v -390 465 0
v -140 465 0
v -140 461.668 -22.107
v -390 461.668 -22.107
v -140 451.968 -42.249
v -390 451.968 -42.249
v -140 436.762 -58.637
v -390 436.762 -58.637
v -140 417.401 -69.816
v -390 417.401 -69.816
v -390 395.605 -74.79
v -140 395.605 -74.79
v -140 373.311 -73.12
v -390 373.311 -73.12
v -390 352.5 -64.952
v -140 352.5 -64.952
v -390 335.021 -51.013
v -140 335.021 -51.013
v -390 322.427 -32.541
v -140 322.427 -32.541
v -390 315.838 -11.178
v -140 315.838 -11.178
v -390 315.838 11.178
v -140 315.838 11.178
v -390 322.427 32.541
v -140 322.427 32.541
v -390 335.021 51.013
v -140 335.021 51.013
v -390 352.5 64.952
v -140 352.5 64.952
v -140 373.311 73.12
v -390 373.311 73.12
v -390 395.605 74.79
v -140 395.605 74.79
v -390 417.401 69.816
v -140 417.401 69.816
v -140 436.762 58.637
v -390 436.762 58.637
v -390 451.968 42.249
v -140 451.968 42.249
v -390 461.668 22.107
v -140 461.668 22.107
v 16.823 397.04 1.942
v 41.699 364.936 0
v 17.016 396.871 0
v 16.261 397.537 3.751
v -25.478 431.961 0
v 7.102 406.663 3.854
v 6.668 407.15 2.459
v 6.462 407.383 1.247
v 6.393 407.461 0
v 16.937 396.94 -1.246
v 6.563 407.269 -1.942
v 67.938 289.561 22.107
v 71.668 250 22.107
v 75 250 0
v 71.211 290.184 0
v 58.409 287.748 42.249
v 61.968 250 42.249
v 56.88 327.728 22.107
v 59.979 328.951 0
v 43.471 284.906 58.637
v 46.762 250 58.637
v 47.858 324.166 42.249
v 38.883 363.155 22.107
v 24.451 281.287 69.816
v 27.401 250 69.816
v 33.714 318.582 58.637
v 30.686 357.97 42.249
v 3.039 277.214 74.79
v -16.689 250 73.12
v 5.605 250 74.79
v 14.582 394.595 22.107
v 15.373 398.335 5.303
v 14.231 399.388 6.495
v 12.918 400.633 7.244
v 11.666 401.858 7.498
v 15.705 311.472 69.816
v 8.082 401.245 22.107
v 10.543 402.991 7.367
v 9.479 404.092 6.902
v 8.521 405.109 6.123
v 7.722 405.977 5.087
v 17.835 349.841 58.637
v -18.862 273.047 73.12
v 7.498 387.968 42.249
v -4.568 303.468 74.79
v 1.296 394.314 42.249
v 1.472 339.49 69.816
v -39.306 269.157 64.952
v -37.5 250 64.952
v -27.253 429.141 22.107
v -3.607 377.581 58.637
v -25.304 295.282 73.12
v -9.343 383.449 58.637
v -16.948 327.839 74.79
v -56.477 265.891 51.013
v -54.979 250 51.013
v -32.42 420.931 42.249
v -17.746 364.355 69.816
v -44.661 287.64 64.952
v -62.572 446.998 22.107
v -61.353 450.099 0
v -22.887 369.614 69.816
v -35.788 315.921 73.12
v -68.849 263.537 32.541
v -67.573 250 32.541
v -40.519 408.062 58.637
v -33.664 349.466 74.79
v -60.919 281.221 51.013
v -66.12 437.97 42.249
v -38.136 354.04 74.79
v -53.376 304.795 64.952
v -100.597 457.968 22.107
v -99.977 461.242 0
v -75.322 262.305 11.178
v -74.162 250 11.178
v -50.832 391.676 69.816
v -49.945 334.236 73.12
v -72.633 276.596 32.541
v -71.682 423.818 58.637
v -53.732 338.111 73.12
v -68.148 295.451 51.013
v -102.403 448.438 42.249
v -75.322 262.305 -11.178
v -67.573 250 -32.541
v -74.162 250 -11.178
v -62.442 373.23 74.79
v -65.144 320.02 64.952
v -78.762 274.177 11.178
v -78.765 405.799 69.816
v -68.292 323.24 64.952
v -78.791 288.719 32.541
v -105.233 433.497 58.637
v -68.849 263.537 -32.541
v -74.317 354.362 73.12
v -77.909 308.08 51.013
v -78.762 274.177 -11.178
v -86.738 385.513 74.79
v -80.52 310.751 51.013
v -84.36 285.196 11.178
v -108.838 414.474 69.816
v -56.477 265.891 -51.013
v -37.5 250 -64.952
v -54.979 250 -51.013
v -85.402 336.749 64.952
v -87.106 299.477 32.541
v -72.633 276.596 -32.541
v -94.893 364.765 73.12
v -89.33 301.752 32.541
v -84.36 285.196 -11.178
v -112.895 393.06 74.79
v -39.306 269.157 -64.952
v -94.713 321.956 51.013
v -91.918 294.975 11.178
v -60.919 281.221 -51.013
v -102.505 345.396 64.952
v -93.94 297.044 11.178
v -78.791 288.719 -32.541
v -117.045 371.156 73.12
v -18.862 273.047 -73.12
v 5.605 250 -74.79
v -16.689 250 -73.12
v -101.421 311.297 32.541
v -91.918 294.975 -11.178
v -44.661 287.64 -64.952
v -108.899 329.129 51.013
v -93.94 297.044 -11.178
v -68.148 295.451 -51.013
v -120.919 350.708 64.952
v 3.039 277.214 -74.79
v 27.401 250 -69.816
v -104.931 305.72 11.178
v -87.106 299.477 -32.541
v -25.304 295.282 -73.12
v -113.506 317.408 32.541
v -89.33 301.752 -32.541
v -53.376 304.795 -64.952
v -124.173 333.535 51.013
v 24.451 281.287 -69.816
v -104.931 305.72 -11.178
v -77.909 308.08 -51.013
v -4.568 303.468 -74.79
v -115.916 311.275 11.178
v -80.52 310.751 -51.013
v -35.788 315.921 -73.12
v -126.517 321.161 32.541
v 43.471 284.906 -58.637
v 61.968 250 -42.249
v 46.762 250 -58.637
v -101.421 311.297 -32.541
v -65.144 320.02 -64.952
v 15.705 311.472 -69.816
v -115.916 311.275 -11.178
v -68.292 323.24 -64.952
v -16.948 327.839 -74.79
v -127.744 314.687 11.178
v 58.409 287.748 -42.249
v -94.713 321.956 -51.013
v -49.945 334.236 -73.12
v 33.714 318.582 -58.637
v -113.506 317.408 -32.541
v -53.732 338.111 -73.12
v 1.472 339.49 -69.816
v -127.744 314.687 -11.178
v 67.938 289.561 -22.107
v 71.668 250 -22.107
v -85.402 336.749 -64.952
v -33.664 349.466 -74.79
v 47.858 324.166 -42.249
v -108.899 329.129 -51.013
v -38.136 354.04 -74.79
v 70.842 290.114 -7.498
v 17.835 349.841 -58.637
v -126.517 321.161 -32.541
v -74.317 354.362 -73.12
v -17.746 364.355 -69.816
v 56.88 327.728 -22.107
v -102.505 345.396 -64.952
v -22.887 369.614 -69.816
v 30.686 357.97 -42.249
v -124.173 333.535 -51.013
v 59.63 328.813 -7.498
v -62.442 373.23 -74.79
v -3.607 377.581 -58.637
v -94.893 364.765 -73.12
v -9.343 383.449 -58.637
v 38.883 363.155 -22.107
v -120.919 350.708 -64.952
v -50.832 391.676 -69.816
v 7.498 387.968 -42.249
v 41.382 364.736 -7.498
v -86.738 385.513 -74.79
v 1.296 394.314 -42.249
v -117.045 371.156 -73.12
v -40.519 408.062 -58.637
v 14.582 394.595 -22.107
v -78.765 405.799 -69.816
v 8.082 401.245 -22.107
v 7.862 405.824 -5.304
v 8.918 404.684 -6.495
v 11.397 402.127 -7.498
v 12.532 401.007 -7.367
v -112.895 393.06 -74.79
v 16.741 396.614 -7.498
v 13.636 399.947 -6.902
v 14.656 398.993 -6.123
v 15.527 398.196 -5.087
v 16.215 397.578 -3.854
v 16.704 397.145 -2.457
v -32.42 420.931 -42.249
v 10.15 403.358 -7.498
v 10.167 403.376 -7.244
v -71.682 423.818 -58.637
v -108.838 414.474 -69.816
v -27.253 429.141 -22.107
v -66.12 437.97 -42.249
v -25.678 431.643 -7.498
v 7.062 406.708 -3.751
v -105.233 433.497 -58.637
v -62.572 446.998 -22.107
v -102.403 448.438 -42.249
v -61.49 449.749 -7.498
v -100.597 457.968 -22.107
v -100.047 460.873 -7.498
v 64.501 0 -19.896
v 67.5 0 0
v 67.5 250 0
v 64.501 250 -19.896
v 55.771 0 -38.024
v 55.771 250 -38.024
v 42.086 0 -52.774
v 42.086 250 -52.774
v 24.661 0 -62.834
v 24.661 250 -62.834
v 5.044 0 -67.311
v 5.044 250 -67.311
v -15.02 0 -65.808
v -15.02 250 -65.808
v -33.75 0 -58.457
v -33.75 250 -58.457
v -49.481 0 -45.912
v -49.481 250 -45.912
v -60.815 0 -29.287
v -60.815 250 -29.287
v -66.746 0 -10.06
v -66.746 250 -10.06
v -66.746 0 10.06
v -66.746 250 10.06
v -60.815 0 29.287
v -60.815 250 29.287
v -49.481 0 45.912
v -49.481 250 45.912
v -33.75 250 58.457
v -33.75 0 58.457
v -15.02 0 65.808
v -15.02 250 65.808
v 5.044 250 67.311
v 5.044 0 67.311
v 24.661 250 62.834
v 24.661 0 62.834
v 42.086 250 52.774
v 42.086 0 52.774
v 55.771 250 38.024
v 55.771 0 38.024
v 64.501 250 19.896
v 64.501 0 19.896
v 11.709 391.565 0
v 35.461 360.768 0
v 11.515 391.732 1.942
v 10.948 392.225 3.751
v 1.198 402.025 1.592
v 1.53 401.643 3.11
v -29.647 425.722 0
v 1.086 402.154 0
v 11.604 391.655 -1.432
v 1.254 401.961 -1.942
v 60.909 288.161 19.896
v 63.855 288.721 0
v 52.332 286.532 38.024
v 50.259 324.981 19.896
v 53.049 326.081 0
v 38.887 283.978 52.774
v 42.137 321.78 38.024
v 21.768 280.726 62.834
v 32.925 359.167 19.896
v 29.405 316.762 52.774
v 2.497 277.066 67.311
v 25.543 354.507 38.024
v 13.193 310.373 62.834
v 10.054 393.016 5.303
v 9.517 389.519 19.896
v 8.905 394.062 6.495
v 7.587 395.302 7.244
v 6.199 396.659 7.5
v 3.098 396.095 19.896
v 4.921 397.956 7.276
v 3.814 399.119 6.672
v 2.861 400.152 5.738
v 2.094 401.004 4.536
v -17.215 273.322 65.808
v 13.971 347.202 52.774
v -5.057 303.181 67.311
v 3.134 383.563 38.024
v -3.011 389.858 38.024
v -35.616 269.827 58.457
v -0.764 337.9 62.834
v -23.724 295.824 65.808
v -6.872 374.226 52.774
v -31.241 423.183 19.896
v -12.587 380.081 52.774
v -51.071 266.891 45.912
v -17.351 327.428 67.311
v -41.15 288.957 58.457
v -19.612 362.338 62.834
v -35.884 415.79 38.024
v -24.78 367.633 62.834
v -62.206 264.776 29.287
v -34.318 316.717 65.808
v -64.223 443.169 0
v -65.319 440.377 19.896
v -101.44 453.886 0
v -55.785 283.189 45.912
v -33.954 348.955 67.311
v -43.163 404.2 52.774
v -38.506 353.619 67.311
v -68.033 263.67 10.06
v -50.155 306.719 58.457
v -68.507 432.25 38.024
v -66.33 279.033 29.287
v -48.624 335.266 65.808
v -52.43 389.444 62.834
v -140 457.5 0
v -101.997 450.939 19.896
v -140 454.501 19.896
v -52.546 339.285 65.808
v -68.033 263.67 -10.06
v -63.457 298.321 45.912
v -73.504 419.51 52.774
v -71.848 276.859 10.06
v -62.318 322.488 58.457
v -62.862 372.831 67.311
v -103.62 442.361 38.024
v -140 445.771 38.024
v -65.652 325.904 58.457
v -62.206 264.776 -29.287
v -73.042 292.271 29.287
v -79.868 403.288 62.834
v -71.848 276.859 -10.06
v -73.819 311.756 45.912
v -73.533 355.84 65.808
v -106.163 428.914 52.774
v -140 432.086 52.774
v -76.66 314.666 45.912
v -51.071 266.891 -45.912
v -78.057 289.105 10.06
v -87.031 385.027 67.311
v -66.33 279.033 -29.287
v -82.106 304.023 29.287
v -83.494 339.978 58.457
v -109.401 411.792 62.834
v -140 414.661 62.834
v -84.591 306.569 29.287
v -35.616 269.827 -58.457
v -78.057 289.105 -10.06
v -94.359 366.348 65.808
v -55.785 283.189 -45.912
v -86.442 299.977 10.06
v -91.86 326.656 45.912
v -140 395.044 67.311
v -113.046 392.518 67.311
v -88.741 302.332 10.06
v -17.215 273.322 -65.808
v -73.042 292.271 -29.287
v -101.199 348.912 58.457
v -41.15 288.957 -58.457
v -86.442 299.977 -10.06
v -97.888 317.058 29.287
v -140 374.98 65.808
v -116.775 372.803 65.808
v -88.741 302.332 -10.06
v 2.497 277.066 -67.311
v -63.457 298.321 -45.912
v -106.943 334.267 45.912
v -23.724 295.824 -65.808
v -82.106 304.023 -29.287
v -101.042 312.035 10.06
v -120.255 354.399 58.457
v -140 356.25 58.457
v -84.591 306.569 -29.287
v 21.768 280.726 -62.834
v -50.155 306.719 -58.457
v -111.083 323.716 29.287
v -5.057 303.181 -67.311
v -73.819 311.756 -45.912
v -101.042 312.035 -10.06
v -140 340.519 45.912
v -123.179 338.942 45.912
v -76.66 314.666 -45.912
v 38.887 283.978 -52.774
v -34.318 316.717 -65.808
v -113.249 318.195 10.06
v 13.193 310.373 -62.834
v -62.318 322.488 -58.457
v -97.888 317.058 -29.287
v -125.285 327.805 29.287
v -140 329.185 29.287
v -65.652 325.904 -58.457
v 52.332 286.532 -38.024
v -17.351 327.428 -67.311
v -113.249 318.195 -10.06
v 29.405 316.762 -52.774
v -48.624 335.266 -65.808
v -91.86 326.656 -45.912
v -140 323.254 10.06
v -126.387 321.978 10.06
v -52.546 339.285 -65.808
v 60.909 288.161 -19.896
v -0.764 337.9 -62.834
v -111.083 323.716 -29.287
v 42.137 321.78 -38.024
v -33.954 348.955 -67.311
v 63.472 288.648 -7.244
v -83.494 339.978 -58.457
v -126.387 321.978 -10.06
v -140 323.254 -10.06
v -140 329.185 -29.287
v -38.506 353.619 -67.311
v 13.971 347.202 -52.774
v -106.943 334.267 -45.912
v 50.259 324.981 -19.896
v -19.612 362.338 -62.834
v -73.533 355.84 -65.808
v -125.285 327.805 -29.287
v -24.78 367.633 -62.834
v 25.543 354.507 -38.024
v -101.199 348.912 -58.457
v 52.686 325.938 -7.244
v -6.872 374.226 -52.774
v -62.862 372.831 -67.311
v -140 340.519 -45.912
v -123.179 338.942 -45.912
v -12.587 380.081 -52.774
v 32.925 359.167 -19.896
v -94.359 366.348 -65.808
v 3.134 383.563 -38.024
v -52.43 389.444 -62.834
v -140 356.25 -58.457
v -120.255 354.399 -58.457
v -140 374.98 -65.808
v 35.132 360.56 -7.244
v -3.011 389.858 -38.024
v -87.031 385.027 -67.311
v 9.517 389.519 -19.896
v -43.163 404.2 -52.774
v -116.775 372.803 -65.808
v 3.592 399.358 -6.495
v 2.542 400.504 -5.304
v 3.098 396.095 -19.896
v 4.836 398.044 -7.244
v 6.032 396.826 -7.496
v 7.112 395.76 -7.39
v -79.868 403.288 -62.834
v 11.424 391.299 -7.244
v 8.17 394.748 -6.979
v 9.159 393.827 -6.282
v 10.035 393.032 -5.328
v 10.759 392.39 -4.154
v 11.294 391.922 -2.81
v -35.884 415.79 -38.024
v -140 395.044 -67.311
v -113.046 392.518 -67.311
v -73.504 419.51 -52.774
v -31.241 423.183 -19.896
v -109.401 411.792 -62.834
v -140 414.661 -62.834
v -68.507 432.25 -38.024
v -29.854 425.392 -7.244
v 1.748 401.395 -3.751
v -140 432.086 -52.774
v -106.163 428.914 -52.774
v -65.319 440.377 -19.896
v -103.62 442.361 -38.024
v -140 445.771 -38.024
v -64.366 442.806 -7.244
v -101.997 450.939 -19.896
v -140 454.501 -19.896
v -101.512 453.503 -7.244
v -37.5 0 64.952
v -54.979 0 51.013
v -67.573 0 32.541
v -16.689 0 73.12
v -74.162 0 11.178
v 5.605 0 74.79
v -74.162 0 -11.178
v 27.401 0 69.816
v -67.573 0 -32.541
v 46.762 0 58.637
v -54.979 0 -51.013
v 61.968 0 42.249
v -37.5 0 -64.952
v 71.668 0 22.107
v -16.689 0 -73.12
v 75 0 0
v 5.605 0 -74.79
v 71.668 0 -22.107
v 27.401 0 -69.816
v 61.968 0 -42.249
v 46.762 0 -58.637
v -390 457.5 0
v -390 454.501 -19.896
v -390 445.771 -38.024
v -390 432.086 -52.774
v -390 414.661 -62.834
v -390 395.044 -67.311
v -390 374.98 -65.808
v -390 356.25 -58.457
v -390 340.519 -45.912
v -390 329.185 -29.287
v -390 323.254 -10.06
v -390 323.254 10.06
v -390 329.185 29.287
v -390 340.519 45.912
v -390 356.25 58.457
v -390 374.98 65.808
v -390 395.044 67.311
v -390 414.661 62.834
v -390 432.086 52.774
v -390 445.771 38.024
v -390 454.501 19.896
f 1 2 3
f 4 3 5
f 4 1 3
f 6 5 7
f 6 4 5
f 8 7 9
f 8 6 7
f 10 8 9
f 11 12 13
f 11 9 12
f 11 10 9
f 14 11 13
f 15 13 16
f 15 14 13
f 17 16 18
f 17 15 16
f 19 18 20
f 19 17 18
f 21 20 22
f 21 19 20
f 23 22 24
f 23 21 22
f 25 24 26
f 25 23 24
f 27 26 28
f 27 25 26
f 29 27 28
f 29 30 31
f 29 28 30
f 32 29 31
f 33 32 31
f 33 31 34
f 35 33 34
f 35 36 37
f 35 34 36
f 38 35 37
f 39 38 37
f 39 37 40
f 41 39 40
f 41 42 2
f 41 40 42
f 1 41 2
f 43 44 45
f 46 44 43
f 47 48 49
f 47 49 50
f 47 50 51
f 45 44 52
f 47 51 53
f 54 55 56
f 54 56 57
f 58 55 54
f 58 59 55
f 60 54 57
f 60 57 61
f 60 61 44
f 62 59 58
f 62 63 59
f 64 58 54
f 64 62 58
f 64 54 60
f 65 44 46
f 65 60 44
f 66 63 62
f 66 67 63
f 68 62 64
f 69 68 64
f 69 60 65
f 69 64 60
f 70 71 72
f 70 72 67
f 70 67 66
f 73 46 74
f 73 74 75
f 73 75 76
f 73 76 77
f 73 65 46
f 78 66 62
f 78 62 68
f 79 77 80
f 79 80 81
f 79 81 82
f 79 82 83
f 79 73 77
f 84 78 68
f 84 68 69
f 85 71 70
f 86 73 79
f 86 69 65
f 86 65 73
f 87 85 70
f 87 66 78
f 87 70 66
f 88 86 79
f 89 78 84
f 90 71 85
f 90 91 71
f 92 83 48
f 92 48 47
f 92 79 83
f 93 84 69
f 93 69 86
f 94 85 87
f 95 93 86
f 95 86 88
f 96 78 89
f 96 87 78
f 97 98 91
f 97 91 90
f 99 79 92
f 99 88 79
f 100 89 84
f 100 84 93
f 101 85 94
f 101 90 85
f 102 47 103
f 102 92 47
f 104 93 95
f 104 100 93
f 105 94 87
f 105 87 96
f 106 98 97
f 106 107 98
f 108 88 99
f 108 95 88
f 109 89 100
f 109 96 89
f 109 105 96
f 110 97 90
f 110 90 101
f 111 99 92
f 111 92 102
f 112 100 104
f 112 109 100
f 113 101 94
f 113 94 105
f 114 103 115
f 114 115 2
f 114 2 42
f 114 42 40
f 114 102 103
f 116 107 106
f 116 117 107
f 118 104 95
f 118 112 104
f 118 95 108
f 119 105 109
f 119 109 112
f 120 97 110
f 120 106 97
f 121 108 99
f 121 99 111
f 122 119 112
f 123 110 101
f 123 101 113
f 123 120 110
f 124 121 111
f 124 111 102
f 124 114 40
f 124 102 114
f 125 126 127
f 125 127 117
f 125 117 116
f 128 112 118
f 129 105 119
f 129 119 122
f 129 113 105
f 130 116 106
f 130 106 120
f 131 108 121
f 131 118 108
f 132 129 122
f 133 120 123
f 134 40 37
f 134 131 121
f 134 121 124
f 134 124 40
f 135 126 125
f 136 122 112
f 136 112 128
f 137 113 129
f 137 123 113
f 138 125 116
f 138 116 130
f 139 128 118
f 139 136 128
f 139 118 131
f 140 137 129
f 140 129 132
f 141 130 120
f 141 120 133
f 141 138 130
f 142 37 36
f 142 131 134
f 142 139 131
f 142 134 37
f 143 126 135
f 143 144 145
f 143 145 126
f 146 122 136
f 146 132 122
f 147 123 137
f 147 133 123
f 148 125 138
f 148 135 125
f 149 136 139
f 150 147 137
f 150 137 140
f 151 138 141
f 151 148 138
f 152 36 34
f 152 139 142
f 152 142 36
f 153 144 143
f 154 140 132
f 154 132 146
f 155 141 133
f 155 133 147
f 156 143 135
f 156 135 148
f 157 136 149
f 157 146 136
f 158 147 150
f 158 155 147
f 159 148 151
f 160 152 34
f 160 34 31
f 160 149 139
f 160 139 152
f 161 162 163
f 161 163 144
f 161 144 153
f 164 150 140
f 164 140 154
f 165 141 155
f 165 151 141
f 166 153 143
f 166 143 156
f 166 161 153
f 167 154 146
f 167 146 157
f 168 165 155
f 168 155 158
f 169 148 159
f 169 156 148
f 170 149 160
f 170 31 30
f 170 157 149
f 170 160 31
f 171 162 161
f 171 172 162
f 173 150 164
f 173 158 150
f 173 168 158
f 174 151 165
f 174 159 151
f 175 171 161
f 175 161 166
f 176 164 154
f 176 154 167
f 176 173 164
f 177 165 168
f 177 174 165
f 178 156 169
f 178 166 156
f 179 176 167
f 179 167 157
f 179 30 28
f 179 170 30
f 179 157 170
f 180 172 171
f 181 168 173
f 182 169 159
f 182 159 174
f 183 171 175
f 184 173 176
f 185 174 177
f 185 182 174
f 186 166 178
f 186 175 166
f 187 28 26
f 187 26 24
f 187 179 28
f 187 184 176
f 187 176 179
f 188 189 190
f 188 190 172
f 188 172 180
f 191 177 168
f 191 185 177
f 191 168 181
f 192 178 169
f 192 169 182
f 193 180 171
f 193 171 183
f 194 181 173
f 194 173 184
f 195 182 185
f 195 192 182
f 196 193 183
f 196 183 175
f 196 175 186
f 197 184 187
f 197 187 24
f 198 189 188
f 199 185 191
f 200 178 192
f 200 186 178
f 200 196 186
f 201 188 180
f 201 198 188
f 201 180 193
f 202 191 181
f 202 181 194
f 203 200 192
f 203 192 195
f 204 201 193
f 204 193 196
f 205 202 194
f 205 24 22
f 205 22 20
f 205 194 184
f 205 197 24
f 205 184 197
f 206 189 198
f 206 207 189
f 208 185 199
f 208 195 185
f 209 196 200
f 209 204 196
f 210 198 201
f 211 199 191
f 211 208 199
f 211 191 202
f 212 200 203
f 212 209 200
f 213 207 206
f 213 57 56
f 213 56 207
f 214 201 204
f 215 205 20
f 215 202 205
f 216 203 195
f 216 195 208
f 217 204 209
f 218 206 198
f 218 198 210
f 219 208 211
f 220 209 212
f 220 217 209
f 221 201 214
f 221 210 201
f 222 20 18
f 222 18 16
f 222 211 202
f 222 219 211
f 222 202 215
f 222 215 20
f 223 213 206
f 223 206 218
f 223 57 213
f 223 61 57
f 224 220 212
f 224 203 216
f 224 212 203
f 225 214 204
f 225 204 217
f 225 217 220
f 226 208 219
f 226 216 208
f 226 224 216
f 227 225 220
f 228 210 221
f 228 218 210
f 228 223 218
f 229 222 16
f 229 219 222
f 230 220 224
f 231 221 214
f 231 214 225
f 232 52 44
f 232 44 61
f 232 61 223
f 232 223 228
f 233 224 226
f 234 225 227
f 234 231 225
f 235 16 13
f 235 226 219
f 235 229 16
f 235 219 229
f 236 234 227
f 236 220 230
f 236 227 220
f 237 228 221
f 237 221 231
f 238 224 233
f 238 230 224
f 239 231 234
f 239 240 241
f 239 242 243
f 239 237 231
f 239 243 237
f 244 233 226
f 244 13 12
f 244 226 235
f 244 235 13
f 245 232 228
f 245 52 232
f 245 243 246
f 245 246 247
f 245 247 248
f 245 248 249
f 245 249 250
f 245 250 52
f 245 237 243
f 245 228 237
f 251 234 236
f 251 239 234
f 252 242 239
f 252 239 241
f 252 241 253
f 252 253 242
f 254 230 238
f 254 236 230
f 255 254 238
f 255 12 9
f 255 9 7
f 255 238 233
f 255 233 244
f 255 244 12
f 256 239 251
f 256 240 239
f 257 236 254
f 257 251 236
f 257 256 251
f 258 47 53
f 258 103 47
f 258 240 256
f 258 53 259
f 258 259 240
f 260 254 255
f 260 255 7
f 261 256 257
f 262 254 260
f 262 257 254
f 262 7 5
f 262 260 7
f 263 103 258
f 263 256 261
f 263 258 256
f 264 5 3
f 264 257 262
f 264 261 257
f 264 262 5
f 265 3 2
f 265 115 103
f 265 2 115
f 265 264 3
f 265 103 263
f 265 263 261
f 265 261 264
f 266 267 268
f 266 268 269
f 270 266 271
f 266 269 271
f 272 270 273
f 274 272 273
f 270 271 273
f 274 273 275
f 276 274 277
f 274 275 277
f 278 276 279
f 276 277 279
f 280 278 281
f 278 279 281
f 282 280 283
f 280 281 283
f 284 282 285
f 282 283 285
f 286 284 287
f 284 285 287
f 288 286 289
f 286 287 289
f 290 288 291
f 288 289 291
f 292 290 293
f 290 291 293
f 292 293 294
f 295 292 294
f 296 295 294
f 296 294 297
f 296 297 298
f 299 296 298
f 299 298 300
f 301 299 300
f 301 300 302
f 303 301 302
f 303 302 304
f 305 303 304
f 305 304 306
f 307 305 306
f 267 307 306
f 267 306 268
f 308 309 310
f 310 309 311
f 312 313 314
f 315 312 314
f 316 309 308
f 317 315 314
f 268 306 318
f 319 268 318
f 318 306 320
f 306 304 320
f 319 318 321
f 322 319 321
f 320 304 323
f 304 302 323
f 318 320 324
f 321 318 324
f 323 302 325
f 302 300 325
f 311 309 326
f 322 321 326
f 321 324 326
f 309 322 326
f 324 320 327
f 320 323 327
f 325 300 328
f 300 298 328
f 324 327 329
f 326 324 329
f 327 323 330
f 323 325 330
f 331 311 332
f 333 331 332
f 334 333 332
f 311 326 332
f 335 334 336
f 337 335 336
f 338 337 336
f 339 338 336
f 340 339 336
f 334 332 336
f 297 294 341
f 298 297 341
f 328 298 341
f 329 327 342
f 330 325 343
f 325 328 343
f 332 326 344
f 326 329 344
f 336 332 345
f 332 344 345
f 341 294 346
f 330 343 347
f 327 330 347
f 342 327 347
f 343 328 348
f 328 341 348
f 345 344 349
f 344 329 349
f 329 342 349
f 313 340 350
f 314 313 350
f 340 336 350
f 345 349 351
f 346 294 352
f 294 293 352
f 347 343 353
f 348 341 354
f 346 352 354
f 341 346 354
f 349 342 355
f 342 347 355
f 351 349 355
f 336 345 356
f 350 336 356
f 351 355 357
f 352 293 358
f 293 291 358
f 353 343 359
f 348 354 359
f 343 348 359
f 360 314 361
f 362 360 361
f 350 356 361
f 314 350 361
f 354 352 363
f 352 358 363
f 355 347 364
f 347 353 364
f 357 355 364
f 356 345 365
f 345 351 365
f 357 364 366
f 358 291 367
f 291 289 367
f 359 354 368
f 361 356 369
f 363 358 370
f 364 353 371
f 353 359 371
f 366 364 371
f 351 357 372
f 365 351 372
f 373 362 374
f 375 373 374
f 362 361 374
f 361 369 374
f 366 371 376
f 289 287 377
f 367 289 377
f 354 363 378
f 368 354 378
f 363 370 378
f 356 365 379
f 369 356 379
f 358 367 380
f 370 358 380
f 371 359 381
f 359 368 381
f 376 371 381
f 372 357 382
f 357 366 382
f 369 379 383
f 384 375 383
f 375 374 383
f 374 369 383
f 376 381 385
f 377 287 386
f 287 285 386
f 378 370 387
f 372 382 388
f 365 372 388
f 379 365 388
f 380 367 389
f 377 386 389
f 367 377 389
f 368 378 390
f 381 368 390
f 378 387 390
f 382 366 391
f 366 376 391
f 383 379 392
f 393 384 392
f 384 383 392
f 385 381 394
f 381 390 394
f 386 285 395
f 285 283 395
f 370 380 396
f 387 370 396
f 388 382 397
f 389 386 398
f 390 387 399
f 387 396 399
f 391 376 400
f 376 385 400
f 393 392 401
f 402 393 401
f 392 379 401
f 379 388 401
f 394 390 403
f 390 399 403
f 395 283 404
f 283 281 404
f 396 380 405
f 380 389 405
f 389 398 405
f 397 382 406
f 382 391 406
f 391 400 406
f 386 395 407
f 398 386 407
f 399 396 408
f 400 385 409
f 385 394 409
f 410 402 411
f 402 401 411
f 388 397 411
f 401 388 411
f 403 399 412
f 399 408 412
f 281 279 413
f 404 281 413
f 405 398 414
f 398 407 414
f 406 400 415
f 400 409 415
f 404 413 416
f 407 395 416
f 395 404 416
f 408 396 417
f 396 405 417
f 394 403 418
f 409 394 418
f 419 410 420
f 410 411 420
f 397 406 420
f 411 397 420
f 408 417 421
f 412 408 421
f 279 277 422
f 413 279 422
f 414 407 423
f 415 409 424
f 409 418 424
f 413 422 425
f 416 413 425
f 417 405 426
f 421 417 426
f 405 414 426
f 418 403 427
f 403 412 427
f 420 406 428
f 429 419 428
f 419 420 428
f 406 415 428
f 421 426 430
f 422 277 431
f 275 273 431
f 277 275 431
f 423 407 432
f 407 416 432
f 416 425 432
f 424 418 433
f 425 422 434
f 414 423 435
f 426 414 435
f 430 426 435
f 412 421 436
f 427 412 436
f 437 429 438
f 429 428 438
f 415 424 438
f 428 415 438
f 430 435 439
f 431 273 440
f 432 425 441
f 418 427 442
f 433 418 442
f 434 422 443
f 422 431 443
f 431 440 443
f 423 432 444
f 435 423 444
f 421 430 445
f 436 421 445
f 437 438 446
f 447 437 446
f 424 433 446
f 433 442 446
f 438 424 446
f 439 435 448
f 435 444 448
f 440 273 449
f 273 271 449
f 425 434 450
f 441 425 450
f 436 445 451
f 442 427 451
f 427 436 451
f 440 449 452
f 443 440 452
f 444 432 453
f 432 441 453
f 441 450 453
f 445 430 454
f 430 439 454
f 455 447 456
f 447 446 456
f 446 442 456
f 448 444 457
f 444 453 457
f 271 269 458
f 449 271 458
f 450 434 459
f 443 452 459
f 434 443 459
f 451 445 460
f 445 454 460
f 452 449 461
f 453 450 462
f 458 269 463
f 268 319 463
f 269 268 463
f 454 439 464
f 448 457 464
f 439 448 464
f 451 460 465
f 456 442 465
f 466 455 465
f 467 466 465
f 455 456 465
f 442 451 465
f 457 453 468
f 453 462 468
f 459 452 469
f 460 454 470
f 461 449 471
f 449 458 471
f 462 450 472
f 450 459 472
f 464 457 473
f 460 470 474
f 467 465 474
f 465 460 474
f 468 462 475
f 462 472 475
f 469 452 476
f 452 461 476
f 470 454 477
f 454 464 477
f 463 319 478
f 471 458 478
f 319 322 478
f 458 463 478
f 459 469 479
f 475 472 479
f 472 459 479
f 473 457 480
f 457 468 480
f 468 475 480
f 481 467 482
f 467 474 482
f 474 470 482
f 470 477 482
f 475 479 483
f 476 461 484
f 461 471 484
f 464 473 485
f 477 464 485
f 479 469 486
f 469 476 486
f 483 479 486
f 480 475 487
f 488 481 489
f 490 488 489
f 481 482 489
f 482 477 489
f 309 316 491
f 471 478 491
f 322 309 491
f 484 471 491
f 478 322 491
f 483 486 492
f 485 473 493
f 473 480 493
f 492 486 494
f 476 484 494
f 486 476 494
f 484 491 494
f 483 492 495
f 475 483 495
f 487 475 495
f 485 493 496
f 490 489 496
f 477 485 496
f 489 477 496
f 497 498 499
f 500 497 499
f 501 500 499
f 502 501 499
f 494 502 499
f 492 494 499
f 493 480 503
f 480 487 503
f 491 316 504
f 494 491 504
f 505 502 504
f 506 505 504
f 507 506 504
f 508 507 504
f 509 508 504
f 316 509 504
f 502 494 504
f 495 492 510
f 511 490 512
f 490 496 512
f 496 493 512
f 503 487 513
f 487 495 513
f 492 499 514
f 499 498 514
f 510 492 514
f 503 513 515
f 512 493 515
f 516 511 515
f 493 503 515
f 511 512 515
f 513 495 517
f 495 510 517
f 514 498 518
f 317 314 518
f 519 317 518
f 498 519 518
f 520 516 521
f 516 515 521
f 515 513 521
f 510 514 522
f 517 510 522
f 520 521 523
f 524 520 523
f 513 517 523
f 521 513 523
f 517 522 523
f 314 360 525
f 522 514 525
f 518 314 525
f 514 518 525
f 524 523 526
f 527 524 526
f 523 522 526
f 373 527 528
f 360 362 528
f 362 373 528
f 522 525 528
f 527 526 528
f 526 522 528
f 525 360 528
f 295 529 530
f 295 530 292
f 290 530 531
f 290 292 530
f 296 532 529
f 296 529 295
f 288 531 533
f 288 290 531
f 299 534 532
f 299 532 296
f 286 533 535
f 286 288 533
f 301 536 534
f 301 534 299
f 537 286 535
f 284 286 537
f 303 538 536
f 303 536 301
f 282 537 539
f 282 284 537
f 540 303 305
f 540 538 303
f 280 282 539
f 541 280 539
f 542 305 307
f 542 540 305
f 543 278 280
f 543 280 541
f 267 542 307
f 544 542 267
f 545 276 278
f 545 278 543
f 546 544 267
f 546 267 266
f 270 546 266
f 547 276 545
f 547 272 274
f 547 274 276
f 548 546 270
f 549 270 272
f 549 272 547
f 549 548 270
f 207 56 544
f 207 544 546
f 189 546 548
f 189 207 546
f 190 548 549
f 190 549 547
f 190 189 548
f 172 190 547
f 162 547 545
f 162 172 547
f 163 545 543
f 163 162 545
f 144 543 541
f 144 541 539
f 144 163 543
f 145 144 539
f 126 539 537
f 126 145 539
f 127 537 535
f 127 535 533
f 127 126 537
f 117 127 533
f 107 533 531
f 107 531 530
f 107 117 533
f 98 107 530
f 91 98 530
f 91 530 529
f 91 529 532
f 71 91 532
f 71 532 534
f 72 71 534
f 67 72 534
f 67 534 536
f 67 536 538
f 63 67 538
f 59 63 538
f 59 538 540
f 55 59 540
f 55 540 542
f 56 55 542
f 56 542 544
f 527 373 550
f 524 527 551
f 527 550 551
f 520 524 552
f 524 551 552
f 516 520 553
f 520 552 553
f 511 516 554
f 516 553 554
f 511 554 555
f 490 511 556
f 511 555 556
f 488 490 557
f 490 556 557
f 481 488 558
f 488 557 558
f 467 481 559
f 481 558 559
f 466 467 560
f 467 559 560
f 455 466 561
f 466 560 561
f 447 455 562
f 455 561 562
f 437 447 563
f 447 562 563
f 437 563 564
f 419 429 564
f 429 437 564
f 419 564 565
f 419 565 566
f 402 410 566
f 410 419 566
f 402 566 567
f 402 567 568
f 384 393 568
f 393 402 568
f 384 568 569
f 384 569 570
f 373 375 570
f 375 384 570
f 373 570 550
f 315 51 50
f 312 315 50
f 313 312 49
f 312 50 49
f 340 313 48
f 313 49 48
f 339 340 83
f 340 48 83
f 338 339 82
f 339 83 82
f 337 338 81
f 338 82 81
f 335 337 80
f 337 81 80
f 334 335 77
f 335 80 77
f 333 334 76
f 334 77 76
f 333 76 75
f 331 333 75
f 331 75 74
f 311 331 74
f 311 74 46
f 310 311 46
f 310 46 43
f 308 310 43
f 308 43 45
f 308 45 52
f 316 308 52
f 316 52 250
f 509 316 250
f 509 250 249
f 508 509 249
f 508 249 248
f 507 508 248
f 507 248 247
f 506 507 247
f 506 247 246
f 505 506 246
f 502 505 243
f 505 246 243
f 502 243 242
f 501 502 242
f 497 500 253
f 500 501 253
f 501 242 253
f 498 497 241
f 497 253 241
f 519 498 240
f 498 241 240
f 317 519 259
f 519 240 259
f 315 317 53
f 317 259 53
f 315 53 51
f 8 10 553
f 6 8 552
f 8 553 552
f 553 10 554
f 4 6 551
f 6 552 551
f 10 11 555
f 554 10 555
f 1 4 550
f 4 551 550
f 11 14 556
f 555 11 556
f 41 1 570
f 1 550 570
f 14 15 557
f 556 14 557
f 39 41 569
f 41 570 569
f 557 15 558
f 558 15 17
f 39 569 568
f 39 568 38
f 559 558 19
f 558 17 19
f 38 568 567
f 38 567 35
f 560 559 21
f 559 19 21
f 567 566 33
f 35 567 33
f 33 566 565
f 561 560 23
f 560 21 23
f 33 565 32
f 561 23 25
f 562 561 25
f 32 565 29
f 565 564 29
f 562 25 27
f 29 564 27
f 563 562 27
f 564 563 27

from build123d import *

# Parameters (mm, degrees)
F0_R     = 75
F0_R_2   = 67.5
F5_R     = 7.5
F6_DEPTH = 150


with BuildPart() as f2:
    # F2: sweep along a path in F1
    with BuildLine(Plane.XY) as f2_path:
        Line((0, 0), (0, 250))
        ThreePointArc((0, 250), (-41.0050506339, 348.9949493661), (-140, 390))
        Line((-140, 390), (-390, 390))
    # F0 (on Front) → F2 (sweep)
    with BuildSketch(Plane.XZ):
        Circle(F0_R)
        Circle(F0_R_2, mode=Mode.SUBTRACT)
    sweep(path=f2_path.line)

    # F5 (on face) → F6 (cut)
    with BuildSketch(Plane(origin=(267.132034356, 267.132034356, 0), x_dir=(-0.7071067812, 0.7071067812, 0), z_dir=(0.7071067812, 0.7071067812, 0))):
        with Locations((276.0982438922, 0)):
            Circle(F5_R)
    extrude(amount=-F6_DEPTH, mode=Mode.SUBTRACT)


solid = f2.part
